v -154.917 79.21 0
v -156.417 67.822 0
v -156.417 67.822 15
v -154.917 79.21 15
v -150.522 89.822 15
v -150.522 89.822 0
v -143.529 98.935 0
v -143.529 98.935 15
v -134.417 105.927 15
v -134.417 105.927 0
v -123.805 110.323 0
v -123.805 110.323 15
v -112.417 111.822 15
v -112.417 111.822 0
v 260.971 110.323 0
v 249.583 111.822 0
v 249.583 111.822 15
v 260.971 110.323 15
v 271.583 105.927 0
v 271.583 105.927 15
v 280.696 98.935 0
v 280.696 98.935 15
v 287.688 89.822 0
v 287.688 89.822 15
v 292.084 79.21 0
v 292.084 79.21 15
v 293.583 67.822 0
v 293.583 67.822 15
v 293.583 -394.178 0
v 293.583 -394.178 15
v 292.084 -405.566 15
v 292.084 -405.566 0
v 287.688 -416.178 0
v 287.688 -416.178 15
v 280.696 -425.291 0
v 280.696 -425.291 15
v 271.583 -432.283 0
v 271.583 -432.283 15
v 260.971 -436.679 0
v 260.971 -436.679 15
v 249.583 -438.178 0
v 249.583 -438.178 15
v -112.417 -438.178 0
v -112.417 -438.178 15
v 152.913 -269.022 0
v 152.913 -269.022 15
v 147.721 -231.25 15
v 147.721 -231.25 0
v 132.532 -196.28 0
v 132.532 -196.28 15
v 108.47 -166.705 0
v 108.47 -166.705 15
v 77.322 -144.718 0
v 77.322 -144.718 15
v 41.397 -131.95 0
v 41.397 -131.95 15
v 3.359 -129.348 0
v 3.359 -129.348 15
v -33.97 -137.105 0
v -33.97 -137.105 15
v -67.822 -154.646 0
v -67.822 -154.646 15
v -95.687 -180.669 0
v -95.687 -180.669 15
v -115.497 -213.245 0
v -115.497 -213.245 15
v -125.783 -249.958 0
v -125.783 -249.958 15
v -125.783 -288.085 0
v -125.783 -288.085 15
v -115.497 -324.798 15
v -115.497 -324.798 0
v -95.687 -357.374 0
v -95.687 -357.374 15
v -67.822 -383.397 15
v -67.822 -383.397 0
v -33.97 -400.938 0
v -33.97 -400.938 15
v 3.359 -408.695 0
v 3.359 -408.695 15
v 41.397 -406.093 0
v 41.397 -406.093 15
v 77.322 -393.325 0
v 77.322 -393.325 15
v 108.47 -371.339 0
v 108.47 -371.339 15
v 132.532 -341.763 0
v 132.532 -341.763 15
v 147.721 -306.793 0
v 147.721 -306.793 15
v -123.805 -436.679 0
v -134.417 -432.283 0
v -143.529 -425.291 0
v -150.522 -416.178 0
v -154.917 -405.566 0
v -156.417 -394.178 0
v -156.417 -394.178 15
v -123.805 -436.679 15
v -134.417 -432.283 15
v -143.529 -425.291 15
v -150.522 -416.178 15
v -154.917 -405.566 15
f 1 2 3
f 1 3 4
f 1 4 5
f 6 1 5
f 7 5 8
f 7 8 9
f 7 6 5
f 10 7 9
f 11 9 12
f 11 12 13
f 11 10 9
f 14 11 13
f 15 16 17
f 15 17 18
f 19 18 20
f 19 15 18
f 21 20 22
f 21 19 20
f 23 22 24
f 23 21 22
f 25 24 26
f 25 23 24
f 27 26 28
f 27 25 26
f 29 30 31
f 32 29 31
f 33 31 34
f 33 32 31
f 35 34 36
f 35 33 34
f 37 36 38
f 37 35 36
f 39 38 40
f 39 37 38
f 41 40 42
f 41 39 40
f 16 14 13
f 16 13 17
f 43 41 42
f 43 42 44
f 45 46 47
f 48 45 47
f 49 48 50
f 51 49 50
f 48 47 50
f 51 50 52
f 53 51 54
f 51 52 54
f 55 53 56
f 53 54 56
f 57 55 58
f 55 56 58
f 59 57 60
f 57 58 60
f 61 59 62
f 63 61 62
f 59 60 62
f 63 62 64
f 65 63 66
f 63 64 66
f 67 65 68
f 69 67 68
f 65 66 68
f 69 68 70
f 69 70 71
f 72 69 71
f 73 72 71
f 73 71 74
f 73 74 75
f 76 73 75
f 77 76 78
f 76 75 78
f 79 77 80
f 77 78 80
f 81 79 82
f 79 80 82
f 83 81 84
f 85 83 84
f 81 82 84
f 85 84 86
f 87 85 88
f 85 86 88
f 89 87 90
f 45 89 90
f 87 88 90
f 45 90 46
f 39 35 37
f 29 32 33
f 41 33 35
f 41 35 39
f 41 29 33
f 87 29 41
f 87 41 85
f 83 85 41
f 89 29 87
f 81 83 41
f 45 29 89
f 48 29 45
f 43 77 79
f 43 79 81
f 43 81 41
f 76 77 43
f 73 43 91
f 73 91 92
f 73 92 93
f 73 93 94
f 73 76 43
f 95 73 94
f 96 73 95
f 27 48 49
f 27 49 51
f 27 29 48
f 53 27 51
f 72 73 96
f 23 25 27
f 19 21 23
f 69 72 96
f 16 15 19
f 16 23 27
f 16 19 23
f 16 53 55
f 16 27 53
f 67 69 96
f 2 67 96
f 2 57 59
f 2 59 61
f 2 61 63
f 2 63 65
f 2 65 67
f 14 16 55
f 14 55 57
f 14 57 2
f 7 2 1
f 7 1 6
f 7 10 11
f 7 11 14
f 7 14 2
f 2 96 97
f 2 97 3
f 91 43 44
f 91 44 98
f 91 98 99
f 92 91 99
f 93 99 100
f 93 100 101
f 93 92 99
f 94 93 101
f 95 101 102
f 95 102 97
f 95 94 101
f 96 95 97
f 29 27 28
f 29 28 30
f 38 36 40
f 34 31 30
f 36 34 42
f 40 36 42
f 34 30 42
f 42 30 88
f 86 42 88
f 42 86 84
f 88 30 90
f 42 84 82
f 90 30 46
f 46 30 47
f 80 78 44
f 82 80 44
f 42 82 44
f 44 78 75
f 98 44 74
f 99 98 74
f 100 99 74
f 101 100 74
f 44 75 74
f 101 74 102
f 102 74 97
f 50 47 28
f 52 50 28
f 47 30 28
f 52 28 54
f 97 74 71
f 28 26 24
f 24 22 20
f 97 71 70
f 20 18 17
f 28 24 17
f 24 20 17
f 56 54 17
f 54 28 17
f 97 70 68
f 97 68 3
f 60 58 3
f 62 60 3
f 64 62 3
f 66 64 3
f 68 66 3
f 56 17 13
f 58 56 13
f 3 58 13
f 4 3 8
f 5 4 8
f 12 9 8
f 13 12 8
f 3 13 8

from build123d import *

# Parameters (mm, degrees)
BOSS_EXTRUDE1_DEPTH = 15
SKETCH7_R           = 140
CUT_EXTRUDE3_DEPTH  = 15


with BuildPart() as part:
    # Sketch1 → Boss-Extrude1 (new body)
    with BuildSketch(Plane.XY):
        with BuildLine():
            Line((-112.416665105, 111.821845345), (249.583334895, 111.821845345))
            ThreePointArc((249.583334895, 111.821845345), (280.696033267, 98.934543717), (293.583334895, 67.821845345))
            Line((293.583334895, 67.821845345), (293.583334895, -394.178154655))
            ThreePointArc((293.583334895, -394.178154655), (280.696033267, -425.290853027), (249.583334895, -438.178154655))
            Line((249.583334895, -438.178154655), (-112.416665105, -438.178154655))
            ThreePointArc((-112.416665105, -438.178154655), (-143.529363477, -425.290853027), (-156.416665105, -394.178154655))
            Line((-156.416665105, -394.178154655), (-156.416665105, 67.821845345))
            ThreePointArc((-156.416665105, 67.821845345), (-143.529363477, 98.934543717), (-112.416665105, 111.821845345))
        make_face()
    extrude(amount=BOSS_EXTRUDE1_DEPTH)

    # Sketch7 → Cut-Extrude3 (cut)
    with BuildSketch(Plane.XY.offset(15)):
        with Locations((12.913034287, -269.02154253)):
            Circle(SKETCH7_R)
    extrude(amount=-CUT_EXTRUDE3_DEPTH, mode=Mode.SUBTRACT)


solid = part.part
